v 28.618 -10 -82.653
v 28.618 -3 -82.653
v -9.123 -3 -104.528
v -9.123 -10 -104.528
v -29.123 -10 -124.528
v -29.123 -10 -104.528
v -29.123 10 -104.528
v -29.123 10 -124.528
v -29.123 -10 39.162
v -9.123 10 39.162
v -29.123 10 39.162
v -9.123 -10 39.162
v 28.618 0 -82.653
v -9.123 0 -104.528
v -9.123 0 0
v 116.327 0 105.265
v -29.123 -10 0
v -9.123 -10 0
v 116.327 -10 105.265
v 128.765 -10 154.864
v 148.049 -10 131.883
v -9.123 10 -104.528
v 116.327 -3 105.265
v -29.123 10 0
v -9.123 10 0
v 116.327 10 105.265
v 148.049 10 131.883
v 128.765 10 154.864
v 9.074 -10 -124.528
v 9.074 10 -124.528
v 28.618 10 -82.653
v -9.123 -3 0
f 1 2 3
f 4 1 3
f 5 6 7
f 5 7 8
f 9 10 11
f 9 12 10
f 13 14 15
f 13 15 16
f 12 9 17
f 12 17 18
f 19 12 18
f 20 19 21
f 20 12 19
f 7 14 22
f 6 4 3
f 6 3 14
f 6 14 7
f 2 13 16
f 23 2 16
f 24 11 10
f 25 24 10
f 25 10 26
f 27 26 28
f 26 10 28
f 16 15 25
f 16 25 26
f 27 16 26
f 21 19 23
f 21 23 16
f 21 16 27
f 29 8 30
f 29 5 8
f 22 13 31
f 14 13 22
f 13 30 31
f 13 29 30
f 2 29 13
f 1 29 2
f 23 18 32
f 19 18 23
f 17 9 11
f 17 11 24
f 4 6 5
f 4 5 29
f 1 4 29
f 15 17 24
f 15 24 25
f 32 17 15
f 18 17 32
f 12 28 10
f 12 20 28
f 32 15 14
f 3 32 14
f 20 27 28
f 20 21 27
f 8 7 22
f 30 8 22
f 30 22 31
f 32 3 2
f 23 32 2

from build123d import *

# Parameters (mm, degrees)
F1_DEPTH      = 10
F1_DEPTH_BACK = 10
F2_DEPTH      = 3
F3_DEPTH      = 10
F3_DEPTH_BACK = 10


with BuildPart() as f1:
    # F0 (on Front) → F1 (new body, two sides)
    with BuildSketch(Plane.XZ) as f1_sk:
        Polygon((-9.122807, 39.162219), (-29.122807, 39.162219), (-29.122807, 0), (-9.122807, 0), (116.327327, 105.265161), (148.048821, 131.882655), (128.765193, 154.863988), align=None)
    extrude(amount=F1_DEPTH)
    extrude(f1_sk.sketch, amount=-F1_DEPTH_BACK)

    # F0 (on Front) → F2 (join)
    with BuildSketch(Plane.XZ):
        Polygon((116.327327, 105.265161), (-9.122807, 0), (-9.122807, -104.527941), (28.618485, -82.653101), align=None)
    extrude(amount=F2_DEPTH)

    # F0 (on Front) → F3 (join, two sides)
    with BuildSketch(Plane.XZ) as f3_sk:
        Polygon((28.618485, -82.653101), (-9.122807, -104.527941), (-29.122807, -104.527941), (-29.122807, -124.527941), (9.073851, -124.527941), align=None)
    extrude(amount=F3_DEPTH)
    extrude(f3_sk.sketch, amount=-F3_DEPTH_BACK)


solid = f1.part
